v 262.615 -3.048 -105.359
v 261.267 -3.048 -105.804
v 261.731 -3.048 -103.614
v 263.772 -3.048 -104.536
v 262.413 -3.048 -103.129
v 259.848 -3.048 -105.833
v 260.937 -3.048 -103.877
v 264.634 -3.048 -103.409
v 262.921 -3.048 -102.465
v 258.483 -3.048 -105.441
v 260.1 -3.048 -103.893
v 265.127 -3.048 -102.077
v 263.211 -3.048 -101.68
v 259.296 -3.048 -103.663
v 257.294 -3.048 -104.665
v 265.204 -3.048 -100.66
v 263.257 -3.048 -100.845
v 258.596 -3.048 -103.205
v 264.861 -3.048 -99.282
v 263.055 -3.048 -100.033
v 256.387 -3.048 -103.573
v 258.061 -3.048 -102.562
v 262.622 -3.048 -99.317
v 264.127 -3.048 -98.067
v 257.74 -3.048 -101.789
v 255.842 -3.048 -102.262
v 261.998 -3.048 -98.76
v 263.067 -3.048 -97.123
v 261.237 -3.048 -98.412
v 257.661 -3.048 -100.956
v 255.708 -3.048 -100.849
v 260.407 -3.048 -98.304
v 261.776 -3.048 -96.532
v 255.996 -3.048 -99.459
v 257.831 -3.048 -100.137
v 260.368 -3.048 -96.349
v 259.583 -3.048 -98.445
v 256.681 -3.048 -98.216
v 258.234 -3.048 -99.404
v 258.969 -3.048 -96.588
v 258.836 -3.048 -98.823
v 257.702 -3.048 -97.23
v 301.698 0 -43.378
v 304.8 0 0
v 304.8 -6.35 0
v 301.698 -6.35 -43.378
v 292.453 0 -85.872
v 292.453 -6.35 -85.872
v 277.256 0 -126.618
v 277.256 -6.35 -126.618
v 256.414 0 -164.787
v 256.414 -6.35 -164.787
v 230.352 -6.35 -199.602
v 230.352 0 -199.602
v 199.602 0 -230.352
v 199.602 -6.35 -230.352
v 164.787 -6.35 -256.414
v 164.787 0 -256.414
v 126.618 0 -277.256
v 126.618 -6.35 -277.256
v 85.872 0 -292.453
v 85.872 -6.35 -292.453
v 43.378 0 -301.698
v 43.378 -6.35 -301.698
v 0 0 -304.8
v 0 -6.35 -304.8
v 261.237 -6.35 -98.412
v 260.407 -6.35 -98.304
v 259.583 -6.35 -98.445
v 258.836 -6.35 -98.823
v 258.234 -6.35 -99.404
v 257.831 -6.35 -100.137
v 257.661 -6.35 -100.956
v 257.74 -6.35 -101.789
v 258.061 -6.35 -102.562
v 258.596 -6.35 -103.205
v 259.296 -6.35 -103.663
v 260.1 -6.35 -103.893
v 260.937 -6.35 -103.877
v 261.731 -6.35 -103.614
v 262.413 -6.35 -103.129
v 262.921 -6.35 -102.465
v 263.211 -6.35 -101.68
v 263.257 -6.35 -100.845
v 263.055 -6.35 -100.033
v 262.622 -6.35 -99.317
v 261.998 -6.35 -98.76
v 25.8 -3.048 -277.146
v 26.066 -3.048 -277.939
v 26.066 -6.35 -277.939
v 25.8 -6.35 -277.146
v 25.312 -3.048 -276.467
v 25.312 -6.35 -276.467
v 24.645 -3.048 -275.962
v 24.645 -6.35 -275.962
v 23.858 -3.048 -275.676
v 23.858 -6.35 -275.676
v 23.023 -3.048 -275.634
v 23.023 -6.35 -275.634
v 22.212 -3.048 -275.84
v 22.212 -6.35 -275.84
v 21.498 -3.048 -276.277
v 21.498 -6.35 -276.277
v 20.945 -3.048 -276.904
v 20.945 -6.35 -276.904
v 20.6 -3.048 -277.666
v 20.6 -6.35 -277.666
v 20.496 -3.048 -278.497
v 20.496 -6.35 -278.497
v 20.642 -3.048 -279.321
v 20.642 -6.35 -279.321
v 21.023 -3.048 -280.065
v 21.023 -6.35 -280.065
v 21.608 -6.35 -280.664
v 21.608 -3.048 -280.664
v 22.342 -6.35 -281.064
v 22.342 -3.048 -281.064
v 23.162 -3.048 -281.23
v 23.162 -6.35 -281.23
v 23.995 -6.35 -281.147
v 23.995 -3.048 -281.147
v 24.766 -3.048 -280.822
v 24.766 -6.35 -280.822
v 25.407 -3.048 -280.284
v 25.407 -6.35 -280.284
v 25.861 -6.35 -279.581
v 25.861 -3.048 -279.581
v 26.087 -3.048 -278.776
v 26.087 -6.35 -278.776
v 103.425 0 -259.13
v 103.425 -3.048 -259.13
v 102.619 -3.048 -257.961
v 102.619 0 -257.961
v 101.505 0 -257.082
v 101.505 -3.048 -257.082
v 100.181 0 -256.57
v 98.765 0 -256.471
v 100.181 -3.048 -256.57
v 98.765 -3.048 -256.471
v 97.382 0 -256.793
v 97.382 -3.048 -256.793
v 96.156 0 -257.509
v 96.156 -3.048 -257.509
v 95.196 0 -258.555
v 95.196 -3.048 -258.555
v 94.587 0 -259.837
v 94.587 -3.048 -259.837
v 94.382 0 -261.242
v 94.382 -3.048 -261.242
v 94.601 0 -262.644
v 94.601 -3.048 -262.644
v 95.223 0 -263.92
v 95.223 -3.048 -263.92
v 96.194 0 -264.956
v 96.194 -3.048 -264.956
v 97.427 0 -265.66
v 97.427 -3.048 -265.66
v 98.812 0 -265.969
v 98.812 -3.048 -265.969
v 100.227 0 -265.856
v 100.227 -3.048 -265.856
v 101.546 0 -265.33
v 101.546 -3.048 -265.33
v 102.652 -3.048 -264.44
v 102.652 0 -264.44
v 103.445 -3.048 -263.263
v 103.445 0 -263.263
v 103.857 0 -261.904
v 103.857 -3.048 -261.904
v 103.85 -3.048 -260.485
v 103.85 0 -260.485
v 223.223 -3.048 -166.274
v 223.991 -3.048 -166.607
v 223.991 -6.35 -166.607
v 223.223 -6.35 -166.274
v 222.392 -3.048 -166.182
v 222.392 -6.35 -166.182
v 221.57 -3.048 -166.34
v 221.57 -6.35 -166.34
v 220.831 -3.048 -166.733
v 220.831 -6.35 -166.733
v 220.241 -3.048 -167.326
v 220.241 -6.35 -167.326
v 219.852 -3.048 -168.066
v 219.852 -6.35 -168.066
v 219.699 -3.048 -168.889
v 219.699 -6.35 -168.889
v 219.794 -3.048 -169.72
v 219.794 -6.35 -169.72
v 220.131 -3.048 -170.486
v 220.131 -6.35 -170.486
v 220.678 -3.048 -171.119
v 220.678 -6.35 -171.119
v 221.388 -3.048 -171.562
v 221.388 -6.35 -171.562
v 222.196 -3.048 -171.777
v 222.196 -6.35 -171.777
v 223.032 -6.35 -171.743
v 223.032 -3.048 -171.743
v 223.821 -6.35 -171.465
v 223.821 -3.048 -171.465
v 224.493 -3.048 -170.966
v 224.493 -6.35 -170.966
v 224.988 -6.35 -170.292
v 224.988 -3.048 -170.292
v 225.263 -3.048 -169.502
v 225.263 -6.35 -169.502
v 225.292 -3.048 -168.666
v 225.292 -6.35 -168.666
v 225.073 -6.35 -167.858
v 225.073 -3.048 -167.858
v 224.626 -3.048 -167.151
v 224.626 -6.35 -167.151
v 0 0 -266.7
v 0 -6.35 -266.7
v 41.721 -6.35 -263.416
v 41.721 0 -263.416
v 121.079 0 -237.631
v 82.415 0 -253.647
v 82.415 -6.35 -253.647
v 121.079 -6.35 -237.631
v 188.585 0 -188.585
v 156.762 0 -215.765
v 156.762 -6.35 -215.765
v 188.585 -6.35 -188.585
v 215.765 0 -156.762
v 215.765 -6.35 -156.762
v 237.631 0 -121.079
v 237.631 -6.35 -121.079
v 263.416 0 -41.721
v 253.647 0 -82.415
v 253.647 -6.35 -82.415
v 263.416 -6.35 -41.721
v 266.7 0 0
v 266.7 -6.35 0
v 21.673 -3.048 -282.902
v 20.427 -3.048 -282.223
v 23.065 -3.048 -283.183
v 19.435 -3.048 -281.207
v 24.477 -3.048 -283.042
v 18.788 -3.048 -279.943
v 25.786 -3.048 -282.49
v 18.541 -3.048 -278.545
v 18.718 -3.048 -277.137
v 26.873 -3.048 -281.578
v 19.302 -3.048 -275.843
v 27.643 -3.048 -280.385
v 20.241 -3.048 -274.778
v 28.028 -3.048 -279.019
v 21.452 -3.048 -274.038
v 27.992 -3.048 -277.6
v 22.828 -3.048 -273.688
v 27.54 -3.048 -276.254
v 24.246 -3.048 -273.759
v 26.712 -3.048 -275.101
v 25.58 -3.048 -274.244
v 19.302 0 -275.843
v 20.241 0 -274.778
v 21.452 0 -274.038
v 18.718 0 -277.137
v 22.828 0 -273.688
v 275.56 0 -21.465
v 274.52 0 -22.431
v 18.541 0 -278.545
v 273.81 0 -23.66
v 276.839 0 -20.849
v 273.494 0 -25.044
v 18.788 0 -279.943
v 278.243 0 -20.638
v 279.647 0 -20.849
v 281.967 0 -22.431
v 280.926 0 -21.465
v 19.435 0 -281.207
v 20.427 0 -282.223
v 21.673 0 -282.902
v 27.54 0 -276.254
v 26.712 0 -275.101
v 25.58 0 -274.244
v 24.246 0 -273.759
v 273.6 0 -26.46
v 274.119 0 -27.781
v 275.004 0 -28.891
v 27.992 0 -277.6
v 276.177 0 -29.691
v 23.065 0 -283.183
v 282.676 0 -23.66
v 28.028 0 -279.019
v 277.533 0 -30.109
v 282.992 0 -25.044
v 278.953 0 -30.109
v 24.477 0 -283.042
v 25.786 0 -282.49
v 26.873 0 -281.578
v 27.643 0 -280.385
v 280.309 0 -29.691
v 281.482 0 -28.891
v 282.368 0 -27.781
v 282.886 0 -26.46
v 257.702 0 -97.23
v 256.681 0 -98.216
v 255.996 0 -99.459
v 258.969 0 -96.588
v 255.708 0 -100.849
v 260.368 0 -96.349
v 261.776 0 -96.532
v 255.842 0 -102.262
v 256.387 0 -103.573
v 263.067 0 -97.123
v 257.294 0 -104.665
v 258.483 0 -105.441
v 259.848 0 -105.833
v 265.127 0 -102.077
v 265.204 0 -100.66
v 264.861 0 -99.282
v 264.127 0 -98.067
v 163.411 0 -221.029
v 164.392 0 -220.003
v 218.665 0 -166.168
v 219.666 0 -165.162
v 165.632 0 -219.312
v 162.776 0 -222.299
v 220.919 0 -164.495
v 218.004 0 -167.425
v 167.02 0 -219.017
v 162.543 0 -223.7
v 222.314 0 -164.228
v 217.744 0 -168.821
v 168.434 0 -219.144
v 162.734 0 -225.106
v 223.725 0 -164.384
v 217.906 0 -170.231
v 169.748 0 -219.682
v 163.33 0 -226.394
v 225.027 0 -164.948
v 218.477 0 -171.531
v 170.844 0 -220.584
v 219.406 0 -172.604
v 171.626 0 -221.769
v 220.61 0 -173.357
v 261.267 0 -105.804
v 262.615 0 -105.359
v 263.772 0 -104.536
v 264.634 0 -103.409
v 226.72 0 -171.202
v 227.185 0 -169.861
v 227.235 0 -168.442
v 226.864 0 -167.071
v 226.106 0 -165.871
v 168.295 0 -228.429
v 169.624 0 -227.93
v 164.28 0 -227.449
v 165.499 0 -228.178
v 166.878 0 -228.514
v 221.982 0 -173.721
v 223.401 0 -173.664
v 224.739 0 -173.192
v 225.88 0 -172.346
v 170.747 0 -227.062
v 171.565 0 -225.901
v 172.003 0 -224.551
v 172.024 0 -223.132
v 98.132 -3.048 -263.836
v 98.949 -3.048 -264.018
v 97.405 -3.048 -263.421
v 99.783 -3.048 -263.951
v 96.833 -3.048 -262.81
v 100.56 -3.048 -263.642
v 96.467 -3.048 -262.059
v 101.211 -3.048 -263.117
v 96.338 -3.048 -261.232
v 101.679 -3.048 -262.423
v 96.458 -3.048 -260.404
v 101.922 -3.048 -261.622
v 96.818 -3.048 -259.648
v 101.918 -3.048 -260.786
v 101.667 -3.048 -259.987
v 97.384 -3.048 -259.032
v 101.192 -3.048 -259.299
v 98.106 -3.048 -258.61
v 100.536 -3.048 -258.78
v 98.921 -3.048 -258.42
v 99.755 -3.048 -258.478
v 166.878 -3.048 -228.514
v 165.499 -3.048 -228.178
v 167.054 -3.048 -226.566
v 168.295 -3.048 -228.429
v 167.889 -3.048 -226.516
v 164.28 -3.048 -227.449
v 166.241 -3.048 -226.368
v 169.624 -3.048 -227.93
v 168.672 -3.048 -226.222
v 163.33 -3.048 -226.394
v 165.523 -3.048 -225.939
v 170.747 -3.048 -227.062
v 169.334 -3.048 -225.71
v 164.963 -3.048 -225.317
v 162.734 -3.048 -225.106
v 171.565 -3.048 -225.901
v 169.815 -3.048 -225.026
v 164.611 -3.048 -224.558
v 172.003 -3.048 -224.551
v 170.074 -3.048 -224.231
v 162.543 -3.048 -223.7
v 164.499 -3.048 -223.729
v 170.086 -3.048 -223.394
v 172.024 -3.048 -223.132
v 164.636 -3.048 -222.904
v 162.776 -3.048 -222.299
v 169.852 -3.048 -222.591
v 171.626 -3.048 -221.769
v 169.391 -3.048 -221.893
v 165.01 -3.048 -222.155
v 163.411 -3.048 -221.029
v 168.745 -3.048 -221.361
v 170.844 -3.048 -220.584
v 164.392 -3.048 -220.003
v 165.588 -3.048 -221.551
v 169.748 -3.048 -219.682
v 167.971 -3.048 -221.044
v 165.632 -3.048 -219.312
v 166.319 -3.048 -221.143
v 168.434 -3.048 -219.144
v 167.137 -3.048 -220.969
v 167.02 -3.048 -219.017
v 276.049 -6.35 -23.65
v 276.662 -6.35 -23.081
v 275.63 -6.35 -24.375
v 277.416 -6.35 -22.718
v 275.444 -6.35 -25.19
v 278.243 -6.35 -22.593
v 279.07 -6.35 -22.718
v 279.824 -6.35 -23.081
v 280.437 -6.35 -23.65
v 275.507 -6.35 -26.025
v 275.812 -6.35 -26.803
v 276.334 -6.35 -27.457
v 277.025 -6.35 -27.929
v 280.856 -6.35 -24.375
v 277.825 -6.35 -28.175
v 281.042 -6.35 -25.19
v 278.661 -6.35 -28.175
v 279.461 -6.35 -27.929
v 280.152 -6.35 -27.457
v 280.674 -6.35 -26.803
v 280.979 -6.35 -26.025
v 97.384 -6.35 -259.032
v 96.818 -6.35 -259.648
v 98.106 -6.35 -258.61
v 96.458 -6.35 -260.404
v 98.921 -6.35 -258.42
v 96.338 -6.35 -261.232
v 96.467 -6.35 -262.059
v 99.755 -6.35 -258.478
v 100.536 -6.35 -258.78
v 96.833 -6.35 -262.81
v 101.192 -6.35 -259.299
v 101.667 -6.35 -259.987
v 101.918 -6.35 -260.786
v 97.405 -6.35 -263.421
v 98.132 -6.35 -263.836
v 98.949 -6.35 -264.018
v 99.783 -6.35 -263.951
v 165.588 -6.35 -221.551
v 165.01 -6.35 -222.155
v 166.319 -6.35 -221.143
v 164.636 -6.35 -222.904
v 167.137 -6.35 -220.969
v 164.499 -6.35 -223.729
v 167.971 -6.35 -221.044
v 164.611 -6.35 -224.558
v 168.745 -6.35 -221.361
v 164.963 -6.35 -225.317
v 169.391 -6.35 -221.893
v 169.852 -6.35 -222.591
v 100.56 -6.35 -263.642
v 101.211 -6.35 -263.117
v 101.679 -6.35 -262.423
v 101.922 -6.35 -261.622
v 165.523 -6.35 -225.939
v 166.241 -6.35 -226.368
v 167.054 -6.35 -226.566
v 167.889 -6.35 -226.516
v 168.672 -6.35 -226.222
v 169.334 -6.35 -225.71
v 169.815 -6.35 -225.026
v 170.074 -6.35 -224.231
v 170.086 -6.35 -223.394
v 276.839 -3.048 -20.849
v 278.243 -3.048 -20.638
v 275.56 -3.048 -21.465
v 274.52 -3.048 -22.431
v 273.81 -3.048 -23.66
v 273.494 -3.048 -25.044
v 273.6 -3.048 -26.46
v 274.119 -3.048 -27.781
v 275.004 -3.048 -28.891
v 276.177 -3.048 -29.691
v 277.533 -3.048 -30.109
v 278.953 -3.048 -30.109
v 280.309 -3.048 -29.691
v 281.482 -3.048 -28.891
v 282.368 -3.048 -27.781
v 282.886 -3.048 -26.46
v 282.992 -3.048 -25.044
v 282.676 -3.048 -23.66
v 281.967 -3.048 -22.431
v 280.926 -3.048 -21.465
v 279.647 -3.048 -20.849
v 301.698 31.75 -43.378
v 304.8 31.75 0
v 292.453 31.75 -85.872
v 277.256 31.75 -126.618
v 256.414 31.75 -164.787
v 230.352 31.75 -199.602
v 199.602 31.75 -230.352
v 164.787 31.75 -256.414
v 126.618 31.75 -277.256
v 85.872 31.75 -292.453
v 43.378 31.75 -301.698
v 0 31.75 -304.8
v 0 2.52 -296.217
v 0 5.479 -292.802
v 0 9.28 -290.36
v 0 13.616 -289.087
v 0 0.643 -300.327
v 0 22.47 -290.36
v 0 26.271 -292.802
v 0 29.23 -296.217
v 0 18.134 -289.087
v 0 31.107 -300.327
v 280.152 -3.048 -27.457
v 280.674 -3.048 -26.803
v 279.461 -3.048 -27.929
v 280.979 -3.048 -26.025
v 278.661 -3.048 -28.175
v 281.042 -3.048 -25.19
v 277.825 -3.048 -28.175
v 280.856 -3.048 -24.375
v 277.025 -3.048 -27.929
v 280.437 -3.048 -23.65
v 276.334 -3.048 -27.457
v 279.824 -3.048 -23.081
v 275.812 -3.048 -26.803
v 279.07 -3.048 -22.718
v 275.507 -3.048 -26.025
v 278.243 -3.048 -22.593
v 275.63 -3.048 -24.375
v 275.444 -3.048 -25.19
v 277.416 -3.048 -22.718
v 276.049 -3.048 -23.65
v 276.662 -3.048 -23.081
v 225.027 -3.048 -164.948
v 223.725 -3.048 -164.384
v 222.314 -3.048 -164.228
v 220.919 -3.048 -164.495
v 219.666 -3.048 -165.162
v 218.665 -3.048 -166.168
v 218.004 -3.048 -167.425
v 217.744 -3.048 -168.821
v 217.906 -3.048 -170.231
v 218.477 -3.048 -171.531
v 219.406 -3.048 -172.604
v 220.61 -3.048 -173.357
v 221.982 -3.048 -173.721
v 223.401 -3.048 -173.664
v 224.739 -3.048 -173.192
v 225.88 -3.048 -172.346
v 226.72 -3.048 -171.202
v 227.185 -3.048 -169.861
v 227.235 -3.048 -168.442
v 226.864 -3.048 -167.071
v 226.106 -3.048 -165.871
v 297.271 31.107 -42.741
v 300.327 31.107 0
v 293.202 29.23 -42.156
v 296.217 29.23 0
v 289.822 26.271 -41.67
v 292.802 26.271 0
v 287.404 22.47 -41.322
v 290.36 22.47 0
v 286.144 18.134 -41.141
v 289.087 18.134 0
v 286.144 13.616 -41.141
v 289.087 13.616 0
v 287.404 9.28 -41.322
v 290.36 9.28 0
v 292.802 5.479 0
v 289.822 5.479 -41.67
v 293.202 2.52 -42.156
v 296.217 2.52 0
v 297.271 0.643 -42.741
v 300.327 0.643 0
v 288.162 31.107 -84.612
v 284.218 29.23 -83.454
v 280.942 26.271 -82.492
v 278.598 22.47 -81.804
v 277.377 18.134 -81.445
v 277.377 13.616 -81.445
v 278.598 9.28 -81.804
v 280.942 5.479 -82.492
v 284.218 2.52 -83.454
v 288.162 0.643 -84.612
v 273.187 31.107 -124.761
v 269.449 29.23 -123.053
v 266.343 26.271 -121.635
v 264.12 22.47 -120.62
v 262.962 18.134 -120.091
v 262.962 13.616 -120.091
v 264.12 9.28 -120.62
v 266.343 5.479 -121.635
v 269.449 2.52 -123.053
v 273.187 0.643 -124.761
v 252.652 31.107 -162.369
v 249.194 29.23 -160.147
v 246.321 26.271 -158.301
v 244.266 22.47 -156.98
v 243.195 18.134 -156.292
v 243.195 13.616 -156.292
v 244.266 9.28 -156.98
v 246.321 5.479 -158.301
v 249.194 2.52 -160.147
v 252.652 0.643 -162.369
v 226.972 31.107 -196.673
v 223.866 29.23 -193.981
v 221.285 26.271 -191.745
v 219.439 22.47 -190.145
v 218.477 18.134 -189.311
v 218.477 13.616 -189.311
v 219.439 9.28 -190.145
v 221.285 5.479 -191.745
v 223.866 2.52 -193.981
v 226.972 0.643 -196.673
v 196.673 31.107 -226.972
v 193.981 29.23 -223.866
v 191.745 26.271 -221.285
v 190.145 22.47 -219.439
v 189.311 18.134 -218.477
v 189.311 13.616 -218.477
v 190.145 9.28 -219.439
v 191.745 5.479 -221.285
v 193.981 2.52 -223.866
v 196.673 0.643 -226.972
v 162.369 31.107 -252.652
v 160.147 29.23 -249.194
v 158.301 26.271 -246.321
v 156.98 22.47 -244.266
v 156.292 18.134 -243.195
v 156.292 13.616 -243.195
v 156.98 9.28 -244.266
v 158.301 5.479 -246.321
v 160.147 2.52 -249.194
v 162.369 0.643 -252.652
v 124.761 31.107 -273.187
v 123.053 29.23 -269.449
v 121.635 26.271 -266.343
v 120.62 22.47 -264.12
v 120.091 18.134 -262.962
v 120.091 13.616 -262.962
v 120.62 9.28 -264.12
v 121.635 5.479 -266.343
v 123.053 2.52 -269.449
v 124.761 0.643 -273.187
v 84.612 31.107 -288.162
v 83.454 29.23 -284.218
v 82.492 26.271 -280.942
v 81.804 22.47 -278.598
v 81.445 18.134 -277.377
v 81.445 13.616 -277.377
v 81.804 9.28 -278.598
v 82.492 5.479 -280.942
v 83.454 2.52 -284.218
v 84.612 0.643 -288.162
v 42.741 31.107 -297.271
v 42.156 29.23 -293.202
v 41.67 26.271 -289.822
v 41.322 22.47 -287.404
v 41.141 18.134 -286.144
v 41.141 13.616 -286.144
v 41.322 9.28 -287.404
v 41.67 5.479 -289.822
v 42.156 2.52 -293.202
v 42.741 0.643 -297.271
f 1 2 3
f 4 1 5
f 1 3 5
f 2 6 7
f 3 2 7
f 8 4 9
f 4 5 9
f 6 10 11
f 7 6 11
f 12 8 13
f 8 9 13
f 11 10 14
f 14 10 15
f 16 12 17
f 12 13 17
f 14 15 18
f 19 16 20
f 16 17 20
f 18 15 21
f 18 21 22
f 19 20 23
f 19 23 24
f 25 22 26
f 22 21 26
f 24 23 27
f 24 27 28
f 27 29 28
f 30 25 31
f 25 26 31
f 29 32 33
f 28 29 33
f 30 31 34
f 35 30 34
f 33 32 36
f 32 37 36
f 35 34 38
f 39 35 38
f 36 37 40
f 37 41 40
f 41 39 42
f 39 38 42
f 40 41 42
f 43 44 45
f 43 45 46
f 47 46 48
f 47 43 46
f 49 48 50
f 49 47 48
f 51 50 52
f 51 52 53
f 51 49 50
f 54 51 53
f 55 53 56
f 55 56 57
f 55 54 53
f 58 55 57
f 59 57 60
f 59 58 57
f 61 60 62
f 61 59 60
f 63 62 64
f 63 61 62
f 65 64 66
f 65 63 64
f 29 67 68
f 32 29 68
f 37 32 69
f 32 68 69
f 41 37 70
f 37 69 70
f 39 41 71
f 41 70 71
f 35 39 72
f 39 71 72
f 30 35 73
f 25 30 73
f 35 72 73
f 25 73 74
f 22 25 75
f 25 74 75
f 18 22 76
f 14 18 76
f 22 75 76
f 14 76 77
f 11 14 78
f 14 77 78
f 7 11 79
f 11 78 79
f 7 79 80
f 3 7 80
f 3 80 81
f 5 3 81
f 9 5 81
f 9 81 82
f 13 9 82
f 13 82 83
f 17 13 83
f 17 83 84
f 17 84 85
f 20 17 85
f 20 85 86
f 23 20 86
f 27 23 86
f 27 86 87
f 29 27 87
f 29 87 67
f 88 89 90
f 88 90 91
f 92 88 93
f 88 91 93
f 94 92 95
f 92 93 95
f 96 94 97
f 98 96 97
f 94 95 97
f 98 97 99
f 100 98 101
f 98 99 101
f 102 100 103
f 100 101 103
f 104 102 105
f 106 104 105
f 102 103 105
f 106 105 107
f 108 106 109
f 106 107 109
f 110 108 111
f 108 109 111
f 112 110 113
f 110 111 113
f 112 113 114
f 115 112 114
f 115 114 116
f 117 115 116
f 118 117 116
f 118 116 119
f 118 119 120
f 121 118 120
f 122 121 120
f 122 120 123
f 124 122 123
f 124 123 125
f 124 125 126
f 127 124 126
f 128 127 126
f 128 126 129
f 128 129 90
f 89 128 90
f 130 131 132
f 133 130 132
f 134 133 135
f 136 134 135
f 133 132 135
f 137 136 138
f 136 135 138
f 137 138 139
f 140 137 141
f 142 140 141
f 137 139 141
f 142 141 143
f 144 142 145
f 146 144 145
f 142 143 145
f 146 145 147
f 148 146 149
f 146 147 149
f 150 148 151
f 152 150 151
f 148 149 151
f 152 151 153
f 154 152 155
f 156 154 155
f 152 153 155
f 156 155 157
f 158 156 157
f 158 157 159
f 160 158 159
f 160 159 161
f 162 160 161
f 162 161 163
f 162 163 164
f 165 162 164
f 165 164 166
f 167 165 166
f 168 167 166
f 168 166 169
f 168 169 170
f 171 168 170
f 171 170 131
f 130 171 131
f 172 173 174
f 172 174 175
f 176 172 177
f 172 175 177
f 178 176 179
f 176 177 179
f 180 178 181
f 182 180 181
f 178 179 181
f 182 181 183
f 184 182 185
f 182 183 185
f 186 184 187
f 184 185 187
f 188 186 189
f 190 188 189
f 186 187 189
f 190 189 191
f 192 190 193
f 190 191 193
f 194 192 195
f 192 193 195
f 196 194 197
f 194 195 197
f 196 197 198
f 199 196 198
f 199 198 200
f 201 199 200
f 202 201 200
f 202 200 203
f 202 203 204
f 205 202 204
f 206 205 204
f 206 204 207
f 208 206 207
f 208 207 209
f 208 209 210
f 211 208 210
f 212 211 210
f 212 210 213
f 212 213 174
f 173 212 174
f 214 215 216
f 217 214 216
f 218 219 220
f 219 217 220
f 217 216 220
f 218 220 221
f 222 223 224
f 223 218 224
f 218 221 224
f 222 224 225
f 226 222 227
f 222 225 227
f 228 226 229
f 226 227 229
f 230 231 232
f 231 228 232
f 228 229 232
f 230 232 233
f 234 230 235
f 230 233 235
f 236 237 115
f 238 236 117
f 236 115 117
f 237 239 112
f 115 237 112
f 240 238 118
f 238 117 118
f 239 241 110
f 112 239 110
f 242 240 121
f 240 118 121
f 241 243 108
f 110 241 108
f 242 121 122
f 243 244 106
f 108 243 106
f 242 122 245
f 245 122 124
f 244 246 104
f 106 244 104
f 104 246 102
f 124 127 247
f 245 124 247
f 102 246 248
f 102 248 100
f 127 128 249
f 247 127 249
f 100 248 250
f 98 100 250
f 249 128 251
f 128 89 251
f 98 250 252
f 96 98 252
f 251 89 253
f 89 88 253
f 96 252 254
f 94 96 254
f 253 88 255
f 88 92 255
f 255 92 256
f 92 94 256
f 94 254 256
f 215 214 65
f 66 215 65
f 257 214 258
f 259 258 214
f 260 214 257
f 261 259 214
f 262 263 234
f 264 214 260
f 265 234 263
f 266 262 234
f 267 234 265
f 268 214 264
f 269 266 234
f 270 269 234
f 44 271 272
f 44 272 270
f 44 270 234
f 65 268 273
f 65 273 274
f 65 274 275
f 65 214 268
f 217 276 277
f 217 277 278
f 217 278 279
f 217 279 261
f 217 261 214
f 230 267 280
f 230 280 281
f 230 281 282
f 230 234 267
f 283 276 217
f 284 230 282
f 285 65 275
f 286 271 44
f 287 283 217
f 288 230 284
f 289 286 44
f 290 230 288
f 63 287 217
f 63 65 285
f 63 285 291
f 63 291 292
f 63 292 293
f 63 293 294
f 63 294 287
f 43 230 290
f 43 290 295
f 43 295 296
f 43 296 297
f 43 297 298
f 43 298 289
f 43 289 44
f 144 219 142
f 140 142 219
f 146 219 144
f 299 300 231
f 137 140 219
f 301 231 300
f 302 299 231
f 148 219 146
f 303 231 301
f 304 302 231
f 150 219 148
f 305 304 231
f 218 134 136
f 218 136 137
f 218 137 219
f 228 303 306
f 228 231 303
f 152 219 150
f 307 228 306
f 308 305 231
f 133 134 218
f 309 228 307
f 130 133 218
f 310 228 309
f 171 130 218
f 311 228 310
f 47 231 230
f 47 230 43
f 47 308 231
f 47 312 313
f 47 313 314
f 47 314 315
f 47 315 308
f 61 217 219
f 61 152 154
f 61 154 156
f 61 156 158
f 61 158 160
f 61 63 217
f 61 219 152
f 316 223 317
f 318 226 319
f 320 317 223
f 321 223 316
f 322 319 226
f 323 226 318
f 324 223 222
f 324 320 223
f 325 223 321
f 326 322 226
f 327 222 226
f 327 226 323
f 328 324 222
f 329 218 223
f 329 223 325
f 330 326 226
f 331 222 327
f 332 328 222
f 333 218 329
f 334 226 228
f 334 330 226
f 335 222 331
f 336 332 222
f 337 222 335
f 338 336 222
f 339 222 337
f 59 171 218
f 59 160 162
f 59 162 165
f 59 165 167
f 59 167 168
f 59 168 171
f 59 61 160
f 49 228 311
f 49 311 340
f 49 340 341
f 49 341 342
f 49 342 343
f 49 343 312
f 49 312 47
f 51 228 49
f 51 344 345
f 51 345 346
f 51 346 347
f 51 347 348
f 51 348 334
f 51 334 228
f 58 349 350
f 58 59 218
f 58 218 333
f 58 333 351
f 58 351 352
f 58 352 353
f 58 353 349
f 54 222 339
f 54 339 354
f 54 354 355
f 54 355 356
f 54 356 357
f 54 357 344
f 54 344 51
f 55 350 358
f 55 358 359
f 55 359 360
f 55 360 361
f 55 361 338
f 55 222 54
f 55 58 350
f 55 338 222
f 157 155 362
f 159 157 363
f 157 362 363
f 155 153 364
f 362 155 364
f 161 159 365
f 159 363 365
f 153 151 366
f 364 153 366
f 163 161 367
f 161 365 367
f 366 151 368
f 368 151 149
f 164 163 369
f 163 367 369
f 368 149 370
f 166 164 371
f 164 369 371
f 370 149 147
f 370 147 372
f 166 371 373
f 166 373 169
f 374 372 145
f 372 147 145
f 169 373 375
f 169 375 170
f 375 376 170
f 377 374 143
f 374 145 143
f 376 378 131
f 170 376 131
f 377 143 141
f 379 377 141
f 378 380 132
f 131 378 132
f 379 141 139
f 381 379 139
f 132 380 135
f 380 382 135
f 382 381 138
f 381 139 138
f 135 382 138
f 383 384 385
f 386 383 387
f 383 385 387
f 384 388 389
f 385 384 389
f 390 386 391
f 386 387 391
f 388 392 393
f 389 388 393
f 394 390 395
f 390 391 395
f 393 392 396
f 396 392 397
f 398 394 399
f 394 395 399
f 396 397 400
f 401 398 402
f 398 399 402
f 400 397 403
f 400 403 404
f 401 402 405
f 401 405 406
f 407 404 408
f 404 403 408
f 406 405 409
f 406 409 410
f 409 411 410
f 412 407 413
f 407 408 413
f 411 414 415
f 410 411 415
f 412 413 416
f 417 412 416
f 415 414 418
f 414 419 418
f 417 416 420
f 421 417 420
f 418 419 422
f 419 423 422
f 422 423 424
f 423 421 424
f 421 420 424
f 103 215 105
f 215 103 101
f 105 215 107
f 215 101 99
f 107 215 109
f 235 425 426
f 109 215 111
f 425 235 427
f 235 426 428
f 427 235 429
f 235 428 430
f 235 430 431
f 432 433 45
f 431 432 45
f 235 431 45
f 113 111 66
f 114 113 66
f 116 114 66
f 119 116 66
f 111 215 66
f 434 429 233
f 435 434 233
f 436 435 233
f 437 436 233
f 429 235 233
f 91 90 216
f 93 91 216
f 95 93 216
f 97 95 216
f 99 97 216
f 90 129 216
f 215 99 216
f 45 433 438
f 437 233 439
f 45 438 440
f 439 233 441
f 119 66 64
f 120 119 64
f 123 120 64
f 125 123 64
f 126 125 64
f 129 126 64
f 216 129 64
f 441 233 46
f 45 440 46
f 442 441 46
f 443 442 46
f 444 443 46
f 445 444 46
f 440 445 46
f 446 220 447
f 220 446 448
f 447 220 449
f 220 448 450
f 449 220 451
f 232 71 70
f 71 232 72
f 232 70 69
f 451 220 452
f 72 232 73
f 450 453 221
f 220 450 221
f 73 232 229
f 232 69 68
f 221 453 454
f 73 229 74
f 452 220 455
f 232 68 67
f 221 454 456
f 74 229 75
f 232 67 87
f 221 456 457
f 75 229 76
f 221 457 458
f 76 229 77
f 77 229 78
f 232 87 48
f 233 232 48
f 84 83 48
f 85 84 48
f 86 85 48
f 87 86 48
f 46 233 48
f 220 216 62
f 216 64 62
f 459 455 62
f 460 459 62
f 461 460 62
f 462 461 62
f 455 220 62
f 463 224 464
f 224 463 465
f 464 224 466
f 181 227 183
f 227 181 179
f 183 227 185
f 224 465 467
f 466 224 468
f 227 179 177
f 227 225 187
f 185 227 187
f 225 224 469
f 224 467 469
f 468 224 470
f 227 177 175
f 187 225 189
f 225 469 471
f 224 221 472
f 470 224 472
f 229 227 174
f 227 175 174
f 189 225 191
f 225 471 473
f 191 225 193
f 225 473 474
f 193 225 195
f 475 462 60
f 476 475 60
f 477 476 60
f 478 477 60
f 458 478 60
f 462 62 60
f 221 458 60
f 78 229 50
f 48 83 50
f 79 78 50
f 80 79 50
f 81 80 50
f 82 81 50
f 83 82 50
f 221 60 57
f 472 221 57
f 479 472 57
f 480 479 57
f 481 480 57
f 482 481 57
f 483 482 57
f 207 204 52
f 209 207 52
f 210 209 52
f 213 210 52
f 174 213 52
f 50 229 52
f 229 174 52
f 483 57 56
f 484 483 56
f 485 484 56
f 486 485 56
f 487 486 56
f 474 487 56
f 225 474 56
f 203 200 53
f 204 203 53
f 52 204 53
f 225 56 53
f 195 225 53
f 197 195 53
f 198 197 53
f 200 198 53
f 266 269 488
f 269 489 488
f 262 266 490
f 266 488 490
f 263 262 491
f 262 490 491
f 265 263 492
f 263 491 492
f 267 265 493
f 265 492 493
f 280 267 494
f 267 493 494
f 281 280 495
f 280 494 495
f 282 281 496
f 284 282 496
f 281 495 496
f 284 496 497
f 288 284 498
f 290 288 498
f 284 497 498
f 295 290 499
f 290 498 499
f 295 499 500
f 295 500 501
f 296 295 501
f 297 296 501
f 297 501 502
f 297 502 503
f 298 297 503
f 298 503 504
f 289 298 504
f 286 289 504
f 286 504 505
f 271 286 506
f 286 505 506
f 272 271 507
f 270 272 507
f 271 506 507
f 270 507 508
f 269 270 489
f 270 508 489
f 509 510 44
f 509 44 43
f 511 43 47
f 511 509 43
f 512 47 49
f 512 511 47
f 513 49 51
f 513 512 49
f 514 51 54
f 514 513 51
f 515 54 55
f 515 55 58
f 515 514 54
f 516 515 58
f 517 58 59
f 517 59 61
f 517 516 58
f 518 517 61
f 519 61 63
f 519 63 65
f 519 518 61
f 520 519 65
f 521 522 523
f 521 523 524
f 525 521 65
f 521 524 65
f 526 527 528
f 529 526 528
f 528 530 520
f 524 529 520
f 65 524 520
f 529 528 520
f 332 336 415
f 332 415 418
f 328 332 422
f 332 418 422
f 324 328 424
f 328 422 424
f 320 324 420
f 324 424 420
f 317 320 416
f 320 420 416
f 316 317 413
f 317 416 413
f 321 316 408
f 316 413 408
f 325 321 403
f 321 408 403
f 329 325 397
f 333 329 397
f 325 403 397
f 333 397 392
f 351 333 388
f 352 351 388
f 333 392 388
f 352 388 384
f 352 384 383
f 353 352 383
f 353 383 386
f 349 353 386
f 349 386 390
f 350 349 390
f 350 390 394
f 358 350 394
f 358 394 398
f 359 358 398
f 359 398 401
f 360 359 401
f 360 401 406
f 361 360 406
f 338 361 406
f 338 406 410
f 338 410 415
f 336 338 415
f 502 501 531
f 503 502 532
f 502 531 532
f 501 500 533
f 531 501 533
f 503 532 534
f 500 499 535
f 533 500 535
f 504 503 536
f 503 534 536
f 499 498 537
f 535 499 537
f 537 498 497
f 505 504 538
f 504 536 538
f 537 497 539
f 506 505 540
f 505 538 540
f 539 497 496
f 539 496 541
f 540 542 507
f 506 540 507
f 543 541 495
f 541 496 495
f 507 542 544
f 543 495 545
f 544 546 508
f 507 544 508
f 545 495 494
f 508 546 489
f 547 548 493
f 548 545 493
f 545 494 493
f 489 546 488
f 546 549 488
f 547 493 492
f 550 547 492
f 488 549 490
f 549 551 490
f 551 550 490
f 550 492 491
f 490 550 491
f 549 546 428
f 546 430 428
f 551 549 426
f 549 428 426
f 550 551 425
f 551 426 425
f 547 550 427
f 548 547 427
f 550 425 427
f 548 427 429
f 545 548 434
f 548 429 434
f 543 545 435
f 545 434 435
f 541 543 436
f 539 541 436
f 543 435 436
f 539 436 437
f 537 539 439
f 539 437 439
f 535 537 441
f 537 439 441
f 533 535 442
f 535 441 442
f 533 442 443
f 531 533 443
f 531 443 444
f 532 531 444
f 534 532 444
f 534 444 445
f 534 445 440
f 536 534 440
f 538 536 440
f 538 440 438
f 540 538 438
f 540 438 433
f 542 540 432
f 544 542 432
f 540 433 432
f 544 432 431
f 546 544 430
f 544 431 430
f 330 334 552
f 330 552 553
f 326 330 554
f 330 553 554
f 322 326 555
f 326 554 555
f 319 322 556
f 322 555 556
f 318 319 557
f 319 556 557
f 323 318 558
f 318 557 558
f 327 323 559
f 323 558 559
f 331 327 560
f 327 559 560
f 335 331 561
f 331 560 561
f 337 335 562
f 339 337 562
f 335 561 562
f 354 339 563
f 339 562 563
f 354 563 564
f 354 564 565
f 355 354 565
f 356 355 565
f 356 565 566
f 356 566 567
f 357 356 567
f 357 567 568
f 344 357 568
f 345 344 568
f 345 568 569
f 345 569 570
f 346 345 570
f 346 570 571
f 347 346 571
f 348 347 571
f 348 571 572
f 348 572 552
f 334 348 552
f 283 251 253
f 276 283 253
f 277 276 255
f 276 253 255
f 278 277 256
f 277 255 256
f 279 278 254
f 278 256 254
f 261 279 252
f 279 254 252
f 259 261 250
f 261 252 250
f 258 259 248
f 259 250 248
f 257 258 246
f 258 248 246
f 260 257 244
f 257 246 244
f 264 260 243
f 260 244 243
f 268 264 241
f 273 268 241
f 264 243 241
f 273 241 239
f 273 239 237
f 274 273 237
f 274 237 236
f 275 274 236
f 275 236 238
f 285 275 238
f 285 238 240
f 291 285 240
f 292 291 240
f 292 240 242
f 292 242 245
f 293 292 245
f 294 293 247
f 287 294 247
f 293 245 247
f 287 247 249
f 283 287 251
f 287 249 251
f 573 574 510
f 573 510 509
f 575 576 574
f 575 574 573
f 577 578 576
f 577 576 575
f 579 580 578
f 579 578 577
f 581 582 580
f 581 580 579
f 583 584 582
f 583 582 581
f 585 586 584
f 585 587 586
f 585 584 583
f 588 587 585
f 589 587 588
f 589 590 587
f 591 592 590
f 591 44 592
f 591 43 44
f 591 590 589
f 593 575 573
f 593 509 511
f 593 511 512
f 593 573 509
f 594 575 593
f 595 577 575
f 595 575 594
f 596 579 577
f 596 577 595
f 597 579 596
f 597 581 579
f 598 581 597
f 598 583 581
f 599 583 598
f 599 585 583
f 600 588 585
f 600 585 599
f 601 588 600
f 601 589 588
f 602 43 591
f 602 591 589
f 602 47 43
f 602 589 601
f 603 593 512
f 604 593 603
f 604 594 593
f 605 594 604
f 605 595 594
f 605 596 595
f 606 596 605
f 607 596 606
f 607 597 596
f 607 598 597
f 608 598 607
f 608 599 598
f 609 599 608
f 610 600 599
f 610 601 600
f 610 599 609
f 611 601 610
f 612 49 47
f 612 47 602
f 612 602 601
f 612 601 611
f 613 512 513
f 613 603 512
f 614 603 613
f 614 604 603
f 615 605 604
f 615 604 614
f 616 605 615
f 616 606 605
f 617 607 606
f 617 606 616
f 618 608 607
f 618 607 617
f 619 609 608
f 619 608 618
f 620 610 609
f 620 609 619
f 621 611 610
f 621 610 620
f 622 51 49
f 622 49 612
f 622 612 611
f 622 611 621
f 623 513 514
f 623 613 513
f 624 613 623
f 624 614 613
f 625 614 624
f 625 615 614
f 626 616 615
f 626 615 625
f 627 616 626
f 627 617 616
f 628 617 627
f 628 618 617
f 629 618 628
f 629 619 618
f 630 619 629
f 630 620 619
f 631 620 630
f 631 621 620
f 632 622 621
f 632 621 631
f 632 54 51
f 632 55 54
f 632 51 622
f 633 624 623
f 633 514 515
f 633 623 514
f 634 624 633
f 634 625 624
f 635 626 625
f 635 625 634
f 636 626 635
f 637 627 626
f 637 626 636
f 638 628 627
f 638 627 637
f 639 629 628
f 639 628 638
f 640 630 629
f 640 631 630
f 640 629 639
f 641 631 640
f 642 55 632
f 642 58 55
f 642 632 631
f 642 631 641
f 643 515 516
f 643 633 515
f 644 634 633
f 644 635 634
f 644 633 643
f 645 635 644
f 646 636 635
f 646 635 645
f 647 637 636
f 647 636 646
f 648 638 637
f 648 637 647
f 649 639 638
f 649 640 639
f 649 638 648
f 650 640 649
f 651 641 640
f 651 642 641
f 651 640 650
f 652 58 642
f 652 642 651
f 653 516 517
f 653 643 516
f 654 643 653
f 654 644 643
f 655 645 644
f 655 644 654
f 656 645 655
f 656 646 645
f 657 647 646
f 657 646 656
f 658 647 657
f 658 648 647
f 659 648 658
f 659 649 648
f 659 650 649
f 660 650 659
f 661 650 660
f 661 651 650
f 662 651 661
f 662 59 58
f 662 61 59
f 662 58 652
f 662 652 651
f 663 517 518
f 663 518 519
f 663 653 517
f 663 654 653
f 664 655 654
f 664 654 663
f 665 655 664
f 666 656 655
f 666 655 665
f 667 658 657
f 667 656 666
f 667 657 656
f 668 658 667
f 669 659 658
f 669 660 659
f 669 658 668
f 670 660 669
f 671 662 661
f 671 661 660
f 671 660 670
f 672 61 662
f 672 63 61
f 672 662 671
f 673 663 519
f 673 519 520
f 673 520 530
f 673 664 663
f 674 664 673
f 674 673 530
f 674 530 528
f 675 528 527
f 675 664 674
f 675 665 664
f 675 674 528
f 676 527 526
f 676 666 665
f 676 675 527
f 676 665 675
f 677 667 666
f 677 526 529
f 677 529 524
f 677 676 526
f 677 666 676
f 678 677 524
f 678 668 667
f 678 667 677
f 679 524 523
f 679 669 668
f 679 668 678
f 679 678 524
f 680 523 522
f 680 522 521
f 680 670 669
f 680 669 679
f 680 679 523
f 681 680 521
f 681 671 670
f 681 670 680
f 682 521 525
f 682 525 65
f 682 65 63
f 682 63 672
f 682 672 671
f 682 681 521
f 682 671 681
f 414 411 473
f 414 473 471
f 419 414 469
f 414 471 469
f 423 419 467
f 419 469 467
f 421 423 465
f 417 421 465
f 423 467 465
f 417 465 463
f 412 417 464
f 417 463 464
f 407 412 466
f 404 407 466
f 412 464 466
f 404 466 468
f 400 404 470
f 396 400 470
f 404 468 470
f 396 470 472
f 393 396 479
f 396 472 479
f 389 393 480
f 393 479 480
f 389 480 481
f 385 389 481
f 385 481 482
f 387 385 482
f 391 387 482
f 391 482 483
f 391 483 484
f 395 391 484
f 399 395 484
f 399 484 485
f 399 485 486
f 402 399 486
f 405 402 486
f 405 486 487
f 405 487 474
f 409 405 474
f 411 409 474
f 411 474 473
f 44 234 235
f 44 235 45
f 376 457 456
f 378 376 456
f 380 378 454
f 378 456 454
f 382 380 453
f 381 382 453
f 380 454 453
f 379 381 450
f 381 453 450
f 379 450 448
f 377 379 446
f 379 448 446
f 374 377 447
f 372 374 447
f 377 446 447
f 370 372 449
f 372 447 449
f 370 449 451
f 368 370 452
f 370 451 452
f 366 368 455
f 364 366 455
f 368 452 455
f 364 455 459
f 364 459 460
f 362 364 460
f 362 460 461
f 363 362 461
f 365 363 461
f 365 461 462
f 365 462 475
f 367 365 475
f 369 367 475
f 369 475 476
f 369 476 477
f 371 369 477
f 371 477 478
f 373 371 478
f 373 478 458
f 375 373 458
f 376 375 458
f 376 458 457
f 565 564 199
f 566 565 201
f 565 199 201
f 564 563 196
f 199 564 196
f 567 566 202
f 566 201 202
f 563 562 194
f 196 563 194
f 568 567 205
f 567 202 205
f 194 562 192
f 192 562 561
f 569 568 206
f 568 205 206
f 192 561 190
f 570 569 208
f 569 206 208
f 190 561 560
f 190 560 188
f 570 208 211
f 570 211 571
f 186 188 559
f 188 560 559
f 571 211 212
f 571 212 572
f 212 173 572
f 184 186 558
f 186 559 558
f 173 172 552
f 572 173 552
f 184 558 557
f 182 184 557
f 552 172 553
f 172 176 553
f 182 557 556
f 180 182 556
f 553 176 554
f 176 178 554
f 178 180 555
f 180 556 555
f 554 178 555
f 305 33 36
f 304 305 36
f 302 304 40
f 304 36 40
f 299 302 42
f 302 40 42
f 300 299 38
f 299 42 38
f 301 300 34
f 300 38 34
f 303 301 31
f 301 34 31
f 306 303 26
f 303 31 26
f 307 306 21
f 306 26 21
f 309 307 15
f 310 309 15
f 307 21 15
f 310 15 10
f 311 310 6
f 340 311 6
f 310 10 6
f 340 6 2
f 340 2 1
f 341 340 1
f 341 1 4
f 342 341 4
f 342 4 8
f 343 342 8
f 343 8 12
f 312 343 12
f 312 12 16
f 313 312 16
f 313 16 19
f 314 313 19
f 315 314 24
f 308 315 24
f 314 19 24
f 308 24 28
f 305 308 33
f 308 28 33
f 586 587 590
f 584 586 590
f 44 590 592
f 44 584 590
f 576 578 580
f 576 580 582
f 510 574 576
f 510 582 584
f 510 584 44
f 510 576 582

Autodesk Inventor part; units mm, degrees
ref_plane "YZ Plane" through (0, 0, 0) normal (1, 0, 0) x (0, 1, 0)
ref_plane "XZ Plane" through (0, 0, 0) normal (0, 1, 0) x (-1, 0, 0)
ref_plane "XY Plane" through (0, 0, 0) normal (0, 0, 1) x (1, 0, 0)
sketch "Sketch2" plane through (0, 0, 0) normal (0, 0, 1) x (1, 0, 0)
  line L0 (304.8, 0) -> (304.8, 31.75)
  arc A0 (304.8, 31.75) -> (304.8, 0) centre (304.8, 15.875) ccw
  line L1 (304.8, 0) -> (266.7, 0)
  line L2 (266.7, 0) -> (266.7, -6.35)
  line L3 (266.7, -6.35) -> (304.8, -6.35)
  line L4 (304.8, -6.35) -> (304.8, 0)
  line L5 (0, 0) -> (304.8, 0) construction
  line L6 (0, -13.97) -> (0, 39.37) projected
  dimension "d0" = 31.75
  dimension "d1" = 304.8
  dimension "d2" = 6.35
  dimension "d8" = 15.875
  dimension "d9" = 38.1
revolve "Revolution1" add sketch "Sketch2" angle 90 about axis through (0, -10, 0) along (0, 1, 0)
sketch "Sketch4" plane through (266.7, 0, 0) normal (0, 1, 0) x (1, 0, 0)
  line L0 (38.1, 0) -> (0, 0) projected
  point P0 (-266.7, 0)
  point P1 (11.5431, 25.4)
  dimension "d10" = 279.4
  dimension "d18" = 25.4
hole "Hole1" at (278.2431, 0, -25.4) direction (0, -1, 0) diameter 5.6134 end through all counterbore diameter 9.525 counterbore depth 3.048 clearance for "Hex Machine Screw" size "#10" standard "Ansi Unified Screw Threads"
pattern_circular "Circular Pattern1" count 6 over 80 about axis through (0, -10, 0) along (0, 1, 0) of "Hole1"
sketch "Sketch3" plane through (0, -6.35, -266.7) normal (-1, 0, 0) x (0, 0, 1)
  arc A0 (-38.1, 6.35) -> (-38.1, 38.1) centre (-38.1, 22.225) ccw projected
  line L0 (-38.1, 38.1) -> (-38.1, 6.35) projected
  line L1 (-38.1, 6.35) -> (-38.1, 38.1)
  line L2 (-38.1, 0) -> (0, 0) projected
  line L3 (-38.1, 6.35) -> (-38.1, 0)
  line L4 (-38.1, 0) -> (0, 0)
  line L5 (0, 6.35) -> (-38.1, 6.35)
  arc A1 (-38.1, 6.35) -> (-38.1, 38.1) centre (-38.1, 22.225) ccw
  line L6 (266.7, 6.35) -> (0, 6.35) projected
  line L7 (0, 0) -> (0, 6.35) projected
  line L8 (0, 6.35) -> (0, 0)
equation "\"d1\" = outerRadius"
equation "\"d8\" = spacerRadius"
equation "\"wheelDiameter\" = 184.15"
equation "\"frisbeeDiameter\" = 228.6"
equation "\"outerRadius\" = 304.8"
equation "\"wheelRadius\" = 0.5 * wheelDiameter"
equation "\"spacerRadius\" = 15.875"
properties part number "Whack01-RunnerForFrisbeeShooter"
